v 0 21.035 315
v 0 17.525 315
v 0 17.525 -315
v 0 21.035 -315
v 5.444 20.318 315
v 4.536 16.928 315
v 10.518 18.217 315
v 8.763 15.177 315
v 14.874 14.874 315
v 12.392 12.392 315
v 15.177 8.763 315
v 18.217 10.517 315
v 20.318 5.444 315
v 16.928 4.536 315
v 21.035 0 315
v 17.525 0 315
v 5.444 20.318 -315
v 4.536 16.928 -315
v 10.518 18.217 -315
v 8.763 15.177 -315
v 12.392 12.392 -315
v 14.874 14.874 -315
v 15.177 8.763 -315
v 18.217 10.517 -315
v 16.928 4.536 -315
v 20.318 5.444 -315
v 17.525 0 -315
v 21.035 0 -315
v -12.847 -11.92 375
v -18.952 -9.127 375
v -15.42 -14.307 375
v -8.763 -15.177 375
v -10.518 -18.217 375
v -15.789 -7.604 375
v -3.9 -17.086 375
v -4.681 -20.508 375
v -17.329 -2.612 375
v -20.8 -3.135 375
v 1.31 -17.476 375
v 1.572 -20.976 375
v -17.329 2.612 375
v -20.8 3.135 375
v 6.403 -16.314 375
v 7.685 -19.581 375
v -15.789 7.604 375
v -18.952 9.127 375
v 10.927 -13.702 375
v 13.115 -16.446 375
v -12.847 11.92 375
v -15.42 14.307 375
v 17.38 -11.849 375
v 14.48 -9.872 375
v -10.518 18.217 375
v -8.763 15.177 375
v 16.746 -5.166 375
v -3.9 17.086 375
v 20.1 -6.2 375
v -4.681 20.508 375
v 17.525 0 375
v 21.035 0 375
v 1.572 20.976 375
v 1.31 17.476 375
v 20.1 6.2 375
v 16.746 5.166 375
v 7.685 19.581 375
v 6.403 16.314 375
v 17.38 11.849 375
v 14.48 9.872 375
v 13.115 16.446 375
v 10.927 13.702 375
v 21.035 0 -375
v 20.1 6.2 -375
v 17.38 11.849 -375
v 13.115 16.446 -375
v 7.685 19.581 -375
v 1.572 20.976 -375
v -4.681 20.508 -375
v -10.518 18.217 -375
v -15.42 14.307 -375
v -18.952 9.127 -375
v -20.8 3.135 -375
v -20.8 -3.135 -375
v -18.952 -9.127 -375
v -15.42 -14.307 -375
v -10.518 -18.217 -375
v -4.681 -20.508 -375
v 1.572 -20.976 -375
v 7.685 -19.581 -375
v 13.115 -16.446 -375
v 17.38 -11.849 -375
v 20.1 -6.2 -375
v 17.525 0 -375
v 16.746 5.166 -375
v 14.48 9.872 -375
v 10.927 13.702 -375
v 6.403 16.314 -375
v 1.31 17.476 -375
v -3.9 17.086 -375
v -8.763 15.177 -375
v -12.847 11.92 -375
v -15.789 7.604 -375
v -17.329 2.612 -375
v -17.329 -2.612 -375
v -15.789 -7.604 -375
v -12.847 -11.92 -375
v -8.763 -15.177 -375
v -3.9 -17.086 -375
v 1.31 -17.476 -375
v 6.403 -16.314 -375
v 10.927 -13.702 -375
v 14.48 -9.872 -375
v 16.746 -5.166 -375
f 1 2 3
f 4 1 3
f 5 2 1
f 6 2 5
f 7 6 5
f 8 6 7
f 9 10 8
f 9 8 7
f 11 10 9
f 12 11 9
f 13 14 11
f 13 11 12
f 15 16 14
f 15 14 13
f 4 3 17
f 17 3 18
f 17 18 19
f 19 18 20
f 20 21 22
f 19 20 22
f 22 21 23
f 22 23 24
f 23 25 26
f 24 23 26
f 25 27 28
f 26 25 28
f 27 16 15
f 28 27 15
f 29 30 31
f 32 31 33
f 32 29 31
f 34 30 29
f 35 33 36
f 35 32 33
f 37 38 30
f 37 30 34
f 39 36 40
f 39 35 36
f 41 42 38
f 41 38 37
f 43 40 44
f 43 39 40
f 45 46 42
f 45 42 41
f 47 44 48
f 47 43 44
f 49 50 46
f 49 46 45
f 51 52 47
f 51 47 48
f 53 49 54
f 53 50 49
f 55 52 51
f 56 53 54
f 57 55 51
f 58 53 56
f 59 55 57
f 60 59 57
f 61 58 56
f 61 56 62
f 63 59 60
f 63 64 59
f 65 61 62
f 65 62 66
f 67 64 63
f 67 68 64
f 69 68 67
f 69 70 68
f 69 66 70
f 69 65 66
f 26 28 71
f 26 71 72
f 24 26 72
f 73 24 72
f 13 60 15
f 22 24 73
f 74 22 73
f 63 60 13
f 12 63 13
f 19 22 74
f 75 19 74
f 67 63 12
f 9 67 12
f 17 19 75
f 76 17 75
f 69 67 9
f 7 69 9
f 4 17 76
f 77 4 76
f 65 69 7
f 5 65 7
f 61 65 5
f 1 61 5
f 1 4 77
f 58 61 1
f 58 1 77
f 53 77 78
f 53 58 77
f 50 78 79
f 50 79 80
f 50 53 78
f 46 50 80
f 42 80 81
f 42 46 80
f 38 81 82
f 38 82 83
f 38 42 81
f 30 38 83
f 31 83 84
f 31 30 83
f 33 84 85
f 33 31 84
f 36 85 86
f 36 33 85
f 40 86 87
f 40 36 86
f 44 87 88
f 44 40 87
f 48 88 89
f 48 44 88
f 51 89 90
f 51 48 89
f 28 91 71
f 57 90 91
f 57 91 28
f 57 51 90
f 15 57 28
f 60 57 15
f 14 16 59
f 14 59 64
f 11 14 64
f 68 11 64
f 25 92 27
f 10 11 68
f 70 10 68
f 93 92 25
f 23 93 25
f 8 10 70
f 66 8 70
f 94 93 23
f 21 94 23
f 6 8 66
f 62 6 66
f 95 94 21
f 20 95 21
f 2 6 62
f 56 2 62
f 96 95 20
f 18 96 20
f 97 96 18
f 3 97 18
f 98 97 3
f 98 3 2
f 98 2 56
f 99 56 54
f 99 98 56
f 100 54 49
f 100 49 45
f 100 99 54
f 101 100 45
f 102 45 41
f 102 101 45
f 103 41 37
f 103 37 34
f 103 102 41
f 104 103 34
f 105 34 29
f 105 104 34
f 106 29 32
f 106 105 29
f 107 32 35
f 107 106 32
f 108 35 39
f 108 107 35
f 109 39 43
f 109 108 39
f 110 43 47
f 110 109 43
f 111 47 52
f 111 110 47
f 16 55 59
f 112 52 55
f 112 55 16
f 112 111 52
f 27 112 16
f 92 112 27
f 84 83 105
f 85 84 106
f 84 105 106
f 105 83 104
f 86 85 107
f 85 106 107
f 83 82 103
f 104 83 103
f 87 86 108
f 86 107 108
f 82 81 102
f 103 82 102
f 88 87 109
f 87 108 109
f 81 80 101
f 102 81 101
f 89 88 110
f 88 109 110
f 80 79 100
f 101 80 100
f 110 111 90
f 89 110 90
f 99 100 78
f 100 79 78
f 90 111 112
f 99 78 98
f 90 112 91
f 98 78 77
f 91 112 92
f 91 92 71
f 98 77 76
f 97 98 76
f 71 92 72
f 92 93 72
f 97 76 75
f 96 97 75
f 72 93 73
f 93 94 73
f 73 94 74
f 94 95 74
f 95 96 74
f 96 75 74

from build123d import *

# Parameters (mm, degrees)
SKIZZE1_R                       = 21.035
SKIZZE1_R_2                     = 17.525
AUFSATZ_LINEAR_AUSTRAGEN1_DEPTH = 375
SKIZZE2_W                       = 50
SKIZZE2_H                       = 630
SCHNITT_LINEAR_AUSTRAGEN1_DEPTH = 377.178072793


with BuildPart() as part:
    # Skizze1 → Aufsatz-Linear austragen1 (new, symmetric)
    with BuildSketch(Plane.XY):
        Circle(SKIZZE1_R)
        Circle(SKIZZE1_R_2, mode=Mode.SUBTRACT)
    extrude(amount=AUFSATZ_LINEAR_AUSTRAGEN1_DEPTH, both=True)

    # Skizze2 → Schnitt-Linear austragen1 (cut, through all)
    with BuildSketch(Plane(origin=(0, 0, 0), x_dir=(1, 0, 0), z_dir=(0, 1, 0))):
        with Locations((25, 0)):
            Rectangle(SKIZZE2_W, SKIZZE2_H)
    extrude(amount=SCHNITT_LINEAR_AUSTRAGEN1_DEPTH, mode=Mode.SUBTRACT)


solid = part.part
